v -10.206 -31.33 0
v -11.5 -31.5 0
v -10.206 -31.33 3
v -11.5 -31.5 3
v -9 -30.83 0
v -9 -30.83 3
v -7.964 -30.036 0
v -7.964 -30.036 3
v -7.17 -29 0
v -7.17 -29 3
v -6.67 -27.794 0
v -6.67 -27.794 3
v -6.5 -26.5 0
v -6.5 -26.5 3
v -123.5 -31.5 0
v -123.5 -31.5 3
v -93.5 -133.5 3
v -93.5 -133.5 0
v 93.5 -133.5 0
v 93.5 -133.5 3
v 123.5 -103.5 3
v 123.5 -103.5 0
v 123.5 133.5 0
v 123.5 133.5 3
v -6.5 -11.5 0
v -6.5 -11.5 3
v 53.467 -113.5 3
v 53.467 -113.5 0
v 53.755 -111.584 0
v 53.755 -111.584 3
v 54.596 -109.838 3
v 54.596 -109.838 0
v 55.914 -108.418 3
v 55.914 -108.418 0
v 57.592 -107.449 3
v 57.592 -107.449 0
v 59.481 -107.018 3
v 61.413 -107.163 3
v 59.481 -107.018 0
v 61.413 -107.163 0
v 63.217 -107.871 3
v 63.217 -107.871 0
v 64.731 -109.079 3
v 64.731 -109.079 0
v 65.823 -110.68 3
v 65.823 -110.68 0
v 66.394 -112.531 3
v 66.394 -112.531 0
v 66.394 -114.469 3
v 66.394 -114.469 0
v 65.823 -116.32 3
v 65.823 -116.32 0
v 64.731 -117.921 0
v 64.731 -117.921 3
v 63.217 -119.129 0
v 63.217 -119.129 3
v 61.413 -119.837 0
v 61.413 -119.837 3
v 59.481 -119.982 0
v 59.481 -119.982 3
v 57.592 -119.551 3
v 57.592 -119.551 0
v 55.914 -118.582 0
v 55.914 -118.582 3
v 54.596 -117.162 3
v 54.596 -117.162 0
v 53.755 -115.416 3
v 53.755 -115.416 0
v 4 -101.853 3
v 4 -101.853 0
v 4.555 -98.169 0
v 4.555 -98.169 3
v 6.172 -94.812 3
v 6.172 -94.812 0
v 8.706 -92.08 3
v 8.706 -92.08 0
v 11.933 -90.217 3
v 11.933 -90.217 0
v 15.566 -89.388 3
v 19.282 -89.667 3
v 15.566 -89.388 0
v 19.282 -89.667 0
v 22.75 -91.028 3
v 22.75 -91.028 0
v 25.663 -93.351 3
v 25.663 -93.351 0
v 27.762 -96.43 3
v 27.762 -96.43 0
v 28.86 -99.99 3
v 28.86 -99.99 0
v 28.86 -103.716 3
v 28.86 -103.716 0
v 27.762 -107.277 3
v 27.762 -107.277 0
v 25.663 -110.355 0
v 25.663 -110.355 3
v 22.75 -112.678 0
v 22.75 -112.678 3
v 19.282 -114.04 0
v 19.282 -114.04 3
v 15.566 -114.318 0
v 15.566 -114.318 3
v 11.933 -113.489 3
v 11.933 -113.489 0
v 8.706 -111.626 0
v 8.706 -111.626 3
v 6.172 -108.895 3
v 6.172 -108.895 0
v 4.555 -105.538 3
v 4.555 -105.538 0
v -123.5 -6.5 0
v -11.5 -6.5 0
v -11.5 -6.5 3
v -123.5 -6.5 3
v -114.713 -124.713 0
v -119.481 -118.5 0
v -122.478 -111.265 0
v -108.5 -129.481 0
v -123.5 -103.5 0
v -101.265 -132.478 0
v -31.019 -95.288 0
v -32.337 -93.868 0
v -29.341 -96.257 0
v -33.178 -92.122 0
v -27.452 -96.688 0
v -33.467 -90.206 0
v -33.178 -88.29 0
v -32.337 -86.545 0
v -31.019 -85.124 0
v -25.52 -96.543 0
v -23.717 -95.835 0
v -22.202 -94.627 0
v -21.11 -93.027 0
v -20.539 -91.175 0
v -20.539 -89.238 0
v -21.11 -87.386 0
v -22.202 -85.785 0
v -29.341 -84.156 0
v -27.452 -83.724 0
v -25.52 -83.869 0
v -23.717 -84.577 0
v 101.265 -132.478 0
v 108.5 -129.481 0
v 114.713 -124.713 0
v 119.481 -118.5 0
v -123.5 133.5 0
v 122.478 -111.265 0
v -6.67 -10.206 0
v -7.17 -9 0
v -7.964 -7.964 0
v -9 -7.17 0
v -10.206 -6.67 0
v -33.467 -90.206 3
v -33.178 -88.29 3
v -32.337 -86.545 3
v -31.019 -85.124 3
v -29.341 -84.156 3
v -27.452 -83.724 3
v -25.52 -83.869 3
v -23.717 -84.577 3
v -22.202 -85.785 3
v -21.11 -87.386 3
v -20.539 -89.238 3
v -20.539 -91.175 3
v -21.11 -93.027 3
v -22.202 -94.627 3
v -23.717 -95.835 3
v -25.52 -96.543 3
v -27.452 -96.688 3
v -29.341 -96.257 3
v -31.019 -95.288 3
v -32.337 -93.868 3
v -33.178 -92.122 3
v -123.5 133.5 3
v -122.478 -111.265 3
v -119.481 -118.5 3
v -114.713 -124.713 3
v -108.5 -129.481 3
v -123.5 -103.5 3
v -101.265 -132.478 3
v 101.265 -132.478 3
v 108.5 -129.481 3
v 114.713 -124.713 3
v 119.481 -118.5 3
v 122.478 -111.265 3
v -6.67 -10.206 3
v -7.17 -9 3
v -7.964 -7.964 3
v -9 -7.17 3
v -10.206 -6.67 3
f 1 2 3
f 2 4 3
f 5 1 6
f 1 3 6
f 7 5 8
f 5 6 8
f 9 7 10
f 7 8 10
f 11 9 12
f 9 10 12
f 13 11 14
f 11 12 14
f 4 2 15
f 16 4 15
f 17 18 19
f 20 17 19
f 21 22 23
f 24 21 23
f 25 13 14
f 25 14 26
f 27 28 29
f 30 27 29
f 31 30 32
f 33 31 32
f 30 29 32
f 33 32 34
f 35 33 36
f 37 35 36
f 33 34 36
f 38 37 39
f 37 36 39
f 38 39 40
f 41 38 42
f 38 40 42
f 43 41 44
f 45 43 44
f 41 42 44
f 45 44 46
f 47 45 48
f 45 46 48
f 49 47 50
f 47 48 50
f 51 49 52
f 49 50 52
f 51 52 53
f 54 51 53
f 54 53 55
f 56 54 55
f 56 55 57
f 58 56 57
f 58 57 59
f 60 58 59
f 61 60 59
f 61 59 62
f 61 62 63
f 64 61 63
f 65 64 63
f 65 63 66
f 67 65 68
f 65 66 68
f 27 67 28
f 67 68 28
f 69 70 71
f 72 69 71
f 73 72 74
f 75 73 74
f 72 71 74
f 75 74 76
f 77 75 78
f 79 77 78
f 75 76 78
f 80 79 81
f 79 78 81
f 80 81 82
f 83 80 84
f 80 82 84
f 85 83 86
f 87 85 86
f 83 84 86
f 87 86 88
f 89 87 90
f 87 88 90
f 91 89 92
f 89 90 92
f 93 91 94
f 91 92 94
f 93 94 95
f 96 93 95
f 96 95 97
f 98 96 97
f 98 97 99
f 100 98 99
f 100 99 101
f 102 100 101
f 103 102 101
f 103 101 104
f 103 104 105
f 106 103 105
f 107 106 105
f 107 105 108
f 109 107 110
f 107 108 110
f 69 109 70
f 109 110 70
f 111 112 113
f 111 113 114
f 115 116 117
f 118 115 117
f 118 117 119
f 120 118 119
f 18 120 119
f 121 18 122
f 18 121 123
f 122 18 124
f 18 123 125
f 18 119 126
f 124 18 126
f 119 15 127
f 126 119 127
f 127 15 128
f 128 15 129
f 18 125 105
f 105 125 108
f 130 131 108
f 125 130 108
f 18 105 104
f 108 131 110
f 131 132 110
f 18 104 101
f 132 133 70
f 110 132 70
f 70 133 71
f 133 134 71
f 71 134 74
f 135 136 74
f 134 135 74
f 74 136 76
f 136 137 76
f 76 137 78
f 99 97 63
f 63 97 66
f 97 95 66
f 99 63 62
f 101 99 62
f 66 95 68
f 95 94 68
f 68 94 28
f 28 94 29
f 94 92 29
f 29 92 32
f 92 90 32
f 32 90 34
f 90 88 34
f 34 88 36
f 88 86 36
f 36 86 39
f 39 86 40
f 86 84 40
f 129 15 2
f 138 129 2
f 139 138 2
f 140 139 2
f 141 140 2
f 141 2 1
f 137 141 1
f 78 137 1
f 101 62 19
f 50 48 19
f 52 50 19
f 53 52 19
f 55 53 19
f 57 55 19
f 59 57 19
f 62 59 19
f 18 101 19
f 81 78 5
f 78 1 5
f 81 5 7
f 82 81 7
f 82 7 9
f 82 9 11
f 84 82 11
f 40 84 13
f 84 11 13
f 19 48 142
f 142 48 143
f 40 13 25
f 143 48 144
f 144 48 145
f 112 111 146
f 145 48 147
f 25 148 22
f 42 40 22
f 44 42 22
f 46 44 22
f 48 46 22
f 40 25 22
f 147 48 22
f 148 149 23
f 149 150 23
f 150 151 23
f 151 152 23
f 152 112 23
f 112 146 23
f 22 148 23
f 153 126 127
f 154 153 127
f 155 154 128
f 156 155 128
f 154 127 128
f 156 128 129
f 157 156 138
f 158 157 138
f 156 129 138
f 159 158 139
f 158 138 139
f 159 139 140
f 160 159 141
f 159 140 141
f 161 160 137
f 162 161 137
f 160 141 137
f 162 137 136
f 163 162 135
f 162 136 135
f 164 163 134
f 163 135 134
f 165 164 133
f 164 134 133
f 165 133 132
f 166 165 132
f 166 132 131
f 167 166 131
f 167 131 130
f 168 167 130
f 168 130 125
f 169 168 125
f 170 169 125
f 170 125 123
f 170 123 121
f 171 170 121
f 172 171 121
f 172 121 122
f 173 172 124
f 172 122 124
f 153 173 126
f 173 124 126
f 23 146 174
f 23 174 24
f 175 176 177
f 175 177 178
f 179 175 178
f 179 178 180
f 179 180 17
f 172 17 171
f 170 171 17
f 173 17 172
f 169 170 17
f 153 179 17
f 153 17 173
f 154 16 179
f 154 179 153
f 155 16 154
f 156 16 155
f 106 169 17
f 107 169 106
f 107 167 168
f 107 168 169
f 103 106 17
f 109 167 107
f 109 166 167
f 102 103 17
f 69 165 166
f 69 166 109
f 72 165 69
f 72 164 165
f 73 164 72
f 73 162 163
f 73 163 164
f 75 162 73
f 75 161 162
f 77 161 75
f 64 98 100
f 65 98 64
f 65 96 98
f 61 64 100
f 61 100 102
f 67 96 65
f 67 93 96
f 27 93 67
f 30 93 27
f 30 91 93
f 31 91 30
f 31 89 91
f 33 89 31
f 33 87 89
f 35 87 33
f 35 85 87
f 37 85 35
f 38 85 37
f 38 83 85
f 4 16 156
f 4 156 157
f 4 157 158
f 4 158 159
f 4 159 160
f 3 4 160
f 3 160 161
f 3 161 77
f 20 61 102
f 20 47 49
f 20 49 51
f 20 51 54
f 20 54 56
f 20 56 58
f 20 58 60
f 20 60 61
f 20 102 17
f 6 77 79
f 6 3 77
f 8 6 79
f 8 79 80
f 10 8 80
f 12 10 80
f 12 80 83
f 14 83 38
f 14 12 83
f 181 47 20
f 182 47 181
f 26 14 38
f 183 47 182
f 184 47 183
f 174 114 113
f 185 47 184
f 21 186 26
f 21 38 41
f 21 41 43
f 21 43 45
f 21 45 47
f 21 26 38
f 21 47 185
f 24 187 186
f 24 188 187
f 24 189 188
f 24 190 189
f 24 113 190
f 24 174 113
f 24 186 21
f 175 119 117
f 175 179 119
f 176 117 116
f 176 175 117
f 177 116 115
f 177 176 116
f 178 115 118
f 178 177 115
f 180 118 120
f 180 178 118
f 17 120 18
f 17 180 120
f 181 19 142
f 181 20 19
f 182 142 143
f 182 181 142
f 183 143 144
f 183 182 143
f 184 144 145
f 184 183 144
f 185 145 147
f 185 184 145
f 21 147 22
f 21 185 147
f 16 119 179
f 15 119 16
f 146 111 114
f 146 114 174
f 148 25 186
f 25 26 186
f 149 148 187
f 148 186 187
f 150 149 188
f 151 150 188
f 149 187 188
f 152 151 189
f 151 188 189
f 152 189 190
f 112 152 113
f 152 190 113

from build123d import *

# Parameters (mm, degrees)
ESQUISSE1_W             = 247
ESQUISSE1_H             = 267
BOSS_EXTRU_1_DEPTH      = 3
ESQUISSE3_R             = 6.5
ESQUISSE3_R_2           = 12.5
ENL_V_MAT_EXTRU_2_DEPTH = 3
ESQUISSE4_W             = 120
ESQUISSE4_H             = 25
ENL_V_MAT_EXTRU_3_DEPTH = 10
CONG_1_R                = 30
CONG_2_R                = 5


with BuildPart() as part:
    # Esquisse1 → Boss.-Extru.1 (new body)
    with BuildSketch(Plane.XY):
        Rectangle(ESQUISSE1_W, ESQUISSE1_H)
    extrude(amount=BOSS_EXTRU_1_DEPTH)

    # Esquisse3 → Enlèv. mat.-Extru.2 (cut)
    with BuildSketch(Plane(origin=(0, 0, 0), x_dir=(-1, 0, 0), z_dir=(0, 0, -1))):
        with Locations((-59.966662183, -113.5)):
            Circle(ESQUISSE3_R)
        with Locations((-16.5, -101.85314297)):
            Circle(ESQUISSE3_R_2)
        with Locations((26.966662183, -90.206285941)):
            Circle(ESQUISSE3_R)
    extrude(amount=-ENL_V_MAT_EXTRU_2_DEPTH, mode=Mode.SUBTRACT)

    # Esquisse4 → Enlèv. mat.-Extru.3 (cut)
    with BuildSketch(Plane(origin=(0, 0, 0), x_dir=(-1, 0, 0), z_dir=(0, 0, -1))):
        with Locations((66.5, -19)):
            Rectangle(ESQUISSE4_W, ESQUISSE4_H)
    extrude(amount=-ENL_V_MAT_EXTRU_3_DEPTH, mode=Mode.SUBTRACT)

    # Congé1
    cong_1_edges = [part.edges().sort_by_distance(p)[0] for p in [
        (123.5, -133.5, 1.5),
        (-123.5, -133.5, 1.5),
    ]]
    fillet(cong_1_edges, radius=CONG_1_R)

    # Congé2
    cong_2_edges = [part.edges().sort_by_distance(p)[0] for p in [
        (-6.5, -31.5, 1.5),
        (-6.5, -6.5, 1.5),
    ]]
    fillet(cong_2_edges, radius=CONG_2_R)


solid = part.part
